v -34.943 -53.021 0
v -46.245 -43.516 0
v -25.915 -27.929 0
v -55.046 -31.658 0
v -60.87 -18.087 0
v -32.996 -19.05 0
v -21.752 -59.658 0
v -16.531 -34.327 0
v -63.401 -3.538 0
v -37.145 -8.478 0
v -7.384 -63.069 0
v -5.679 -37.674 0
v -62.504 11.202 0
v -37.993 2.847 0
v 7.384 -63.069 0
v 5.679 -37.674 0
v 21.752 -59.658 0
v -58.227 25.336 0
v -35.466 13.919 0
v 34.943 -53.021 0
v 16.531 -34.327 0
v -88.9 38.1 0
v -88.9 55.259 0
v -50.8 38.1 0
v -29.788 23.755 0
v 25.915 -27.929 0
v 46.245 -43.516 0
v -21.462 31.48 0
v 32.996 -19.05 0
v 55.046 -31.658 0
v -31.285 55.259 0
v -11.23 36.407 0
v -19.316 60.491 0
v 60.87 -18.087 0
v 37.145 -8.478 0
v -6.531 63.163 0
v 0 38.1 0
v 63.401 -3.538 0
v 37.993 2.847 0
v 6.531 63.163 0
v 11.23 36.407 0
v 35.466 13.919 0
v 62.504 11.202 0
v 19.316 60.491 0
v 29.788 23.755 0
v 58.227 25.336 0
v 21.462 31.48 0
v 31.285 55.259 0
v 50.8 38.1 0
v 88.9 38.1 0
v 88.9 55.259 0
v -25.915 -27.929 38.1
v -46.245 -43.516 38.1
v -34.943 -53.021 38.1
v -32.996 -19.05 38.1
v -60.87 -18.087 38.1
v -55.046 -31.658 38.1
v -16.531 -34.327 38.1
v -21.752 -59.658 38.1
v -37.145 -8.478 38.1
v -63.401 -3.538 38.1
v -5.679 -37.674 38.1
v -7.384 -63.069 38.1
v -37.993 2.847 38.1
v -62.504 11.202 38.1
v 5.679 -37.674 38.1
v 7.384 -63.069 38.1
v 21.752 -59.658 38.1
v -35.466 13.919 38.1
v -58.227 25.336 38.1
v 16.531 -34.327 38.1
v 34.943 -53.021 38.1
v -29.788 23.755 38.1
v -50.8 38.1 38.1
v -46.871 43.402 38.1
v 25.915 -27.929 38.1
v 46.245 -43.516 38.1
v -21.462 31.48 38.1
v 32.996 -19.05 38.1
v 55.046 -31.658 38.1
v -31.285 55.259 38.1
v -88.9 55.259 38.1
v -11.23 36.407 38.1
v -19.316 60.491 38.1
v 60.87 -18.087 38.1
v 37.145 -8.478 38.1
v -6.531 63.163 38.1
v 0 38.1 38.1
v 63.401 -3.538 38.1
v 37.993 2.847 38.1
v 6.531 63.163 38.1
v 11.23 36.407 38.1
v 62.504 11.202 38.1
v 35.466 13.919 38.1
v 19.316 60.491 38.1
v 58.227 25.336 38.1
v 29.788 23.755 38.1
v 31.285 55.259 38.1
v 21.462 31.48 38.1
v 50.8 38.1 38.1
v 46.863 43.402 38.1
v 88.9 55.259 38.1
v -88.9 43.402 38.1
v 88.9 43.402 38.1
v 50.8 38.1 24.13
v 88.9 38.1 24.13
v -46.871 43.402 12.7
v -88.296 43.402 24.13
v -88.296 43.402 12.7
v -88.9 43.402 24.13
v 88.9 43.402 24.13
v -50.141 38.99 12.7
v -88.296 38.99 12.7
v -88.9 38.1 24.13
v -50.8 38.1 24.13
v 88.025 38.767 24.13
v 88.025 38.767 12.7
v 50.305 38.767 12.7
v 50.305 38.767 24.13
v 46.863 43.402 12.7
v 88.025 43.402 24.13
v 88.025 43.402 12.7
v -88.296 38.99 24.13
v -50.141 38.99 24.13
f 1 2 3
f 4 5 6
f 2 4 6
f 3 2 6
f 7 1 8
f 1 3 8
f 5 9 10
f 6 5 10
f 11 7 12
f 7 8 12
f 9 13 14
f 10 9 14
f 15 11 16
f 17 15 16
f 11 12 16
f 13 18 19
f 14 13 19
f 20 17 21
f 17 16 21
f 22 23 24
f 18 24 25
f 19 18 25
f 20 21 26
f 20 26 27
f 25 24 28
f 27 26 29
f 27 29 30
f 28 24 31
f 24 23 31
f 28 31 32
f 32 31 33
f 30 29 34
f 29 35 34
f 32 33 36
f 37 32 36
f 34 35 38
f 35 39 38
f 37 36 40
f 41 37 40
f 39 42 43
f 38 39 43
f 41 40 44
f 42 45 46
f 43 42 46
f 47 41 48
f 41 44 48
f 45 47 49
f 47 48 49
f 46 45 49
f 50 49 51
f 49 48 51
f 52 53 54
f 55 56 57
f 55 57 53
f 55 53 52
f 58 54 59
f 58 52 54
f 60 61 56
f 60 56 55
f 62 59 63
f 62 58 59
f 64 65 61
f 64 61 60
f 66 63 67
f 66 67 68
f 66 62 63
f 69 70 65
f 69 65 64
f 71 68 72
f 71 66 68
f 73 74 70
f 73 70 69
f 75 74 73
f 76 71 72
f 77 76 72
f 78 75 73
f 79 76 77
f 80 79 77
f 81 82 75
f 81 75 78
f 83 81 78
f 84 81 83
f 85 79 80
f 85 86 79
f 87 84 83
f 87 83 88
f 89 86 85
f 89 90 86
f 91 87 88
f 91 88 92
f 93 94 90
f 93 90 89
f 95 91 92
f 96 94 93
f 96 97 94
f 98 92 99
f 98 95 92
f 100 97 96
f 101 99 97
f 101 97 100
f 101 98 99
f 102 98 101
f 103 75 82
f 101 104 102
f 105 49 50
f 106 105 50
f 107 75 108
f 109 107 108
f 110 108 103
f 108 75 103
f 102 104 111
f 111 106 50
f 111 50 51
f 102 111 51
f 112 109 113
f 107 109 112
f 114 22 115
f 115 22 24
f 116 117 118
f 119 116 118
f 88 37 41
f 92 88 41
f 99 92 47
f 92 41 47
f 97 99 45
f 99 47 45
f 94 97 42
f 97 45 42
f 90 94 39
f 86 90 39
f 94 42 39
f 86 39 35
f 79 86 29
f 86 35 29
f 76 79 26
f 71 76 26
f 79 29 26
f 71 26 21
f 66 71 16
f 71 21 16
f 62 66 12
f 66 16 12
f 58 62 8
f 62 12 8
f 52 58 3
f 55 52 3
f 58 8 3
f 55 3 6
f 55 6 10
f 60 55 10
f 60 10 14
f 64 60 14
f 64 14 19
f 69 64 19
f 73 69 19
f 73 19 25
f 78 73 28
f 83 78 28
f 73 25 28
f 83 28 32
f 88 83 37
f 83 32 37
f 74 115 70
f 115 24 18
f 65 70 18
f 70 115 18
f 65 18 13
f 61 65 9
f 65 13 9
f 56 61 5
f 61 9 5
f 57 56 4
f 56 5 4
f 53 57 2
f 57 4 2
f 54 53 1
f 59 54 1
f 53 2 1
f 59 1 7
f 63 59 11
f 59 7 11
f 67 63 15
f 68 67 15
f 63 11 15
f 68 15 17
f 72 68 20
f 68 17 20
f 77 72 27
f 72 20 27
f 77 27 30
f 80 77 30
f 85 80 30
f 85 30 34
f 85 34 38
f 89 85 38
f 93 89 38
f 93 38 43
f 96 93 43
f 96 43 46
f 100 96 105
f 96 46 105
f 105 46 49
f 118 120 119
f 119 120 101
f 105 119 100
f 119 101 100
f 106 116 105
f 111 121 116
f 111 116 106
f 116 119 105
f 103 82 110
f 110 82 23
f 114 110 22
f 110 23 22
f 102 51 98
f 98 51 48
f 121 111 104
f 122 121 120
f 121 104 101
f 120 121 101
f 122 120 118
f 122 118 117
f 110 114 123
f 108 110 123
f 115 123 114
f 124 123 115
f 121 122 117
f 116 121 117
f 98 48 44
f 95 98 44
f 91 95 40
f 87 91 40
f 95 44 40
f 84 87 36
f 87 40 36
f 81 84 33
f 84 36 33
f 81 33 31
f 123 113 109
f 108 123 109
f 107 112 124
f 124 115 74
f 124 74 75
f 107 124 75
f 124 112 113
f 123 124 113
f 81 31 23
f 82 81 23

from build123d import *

# Parameters (mm, degrees)
F1_DEPTH = 38.1
F3_DEPTH = 25.4
F5_DEPTH = 11.43


with BuildPart() as f1:
    # F0 (on Top) → F1 (new body)
    with BuildSketch(Plane.XY):
        with BuildLine():
            ThreePointArc((-50.8, 38.1), (-20.0804631421, -60.2413894262), (63.5, 0))
            ThreePointArc((63.5, 0), (60.2413894262, 20.0804631421), (50.8, 38.1))
            Line((50.8, 38.1), (0, 38.1))
            Line((0, 38.1), (-50.8, 38.1))
        make_face()
        with BuildLine():
            ThreePointArc((38.1, 0), (-26.9407683632, -26.9407683632), (0, 38.1))
            ThreePointArc((0, 38.1), (26.9407683632, 26.9407683632), (38.1, 0))
        make_face(mode=Mode.SUBTRACT)
        with BuildLine():
            Line((0, 38.1), (50.8, 38.1))
            ThreePointArc((50.8, 38.1), (41.9294068416, 47.6883092792), (31.2845870641, 55.258706212))
            Line((31.2845870641, 55.258706212), (0, 55.258706212))
            Line((0, 55.258706212), (0, 38.1))
        make_face()
        with BuildLine():
            ThreePointArc((31.2845870641, 55.258706212), (41.9294068416, 47.6883092792), (50.8, 38.1))
            Line((50.8, 38.1), (88.9, 38.1))
            Line((88.9, 38.1), (88.9, 55.258706212))
            Line((88.9, 55.258706212), (31.2845870641, 55.258706212))
        make_face()
        with BuildLine():
            Line((-88.9, 38.1), (-50.8, 38.1))
            ThreePointArc((-50.8, 38.1), (-41.9294068416, 47.6883092792), (-31.2845870641, 55.258706212))
            Line((-31.2845870641, 55.258706212), (-88.9, 55.258706212))
            Line((-88.9, 55.258706212), (-88.9, 38.1))
        make_face()
        with BuildLine():
            ThreePointArc((-31.2845870641, 55.258706212), (-41.9294068416, 47.6883092792), (-50.8, 38.1))
            Line((-50.8, 38.1), (0, 38.1))
            Line((0, 38.1), (0, 55.258706212))
            Line((0, 55.258706212), (-31.2845870641, 55.258706212))
        make_face()
        with BuildLine():
            Line((0, 55.258706212), (31.2845870641, 55.258706212))
            ThreePointArc((31.2845870641, 55.258706212), (0, 63.5), (-31.2845870641, 55.258706212))
            Line((-31.2845870641, 55.258706212), (0, 55.258706212))
        make_face()
    extrude(amount=F1_DEPTH)

    # F2 (on face) → F3 (cut)
    with BuildSketch(Plane.XY.offset(38.1)):
        Polygon((-46.8710027635, 43.4018671513), (-88.9, 43.4018671513), (-88.9, 38.1), (-50.8, 38.1), align=None)
        Polygon((88.9, 38.1), (88.9, 43.4018671513), (46.863, 43.4018671513), (50.8, 38.1), align=None)
    extrude(amount=-F3_DEPTH, mode=Mode.SUBTRACT)

    # F4 (on face) → F5 (join)
    with BuildSketch(Plane.XY.offset(12.7)):
        Polygon((-50.1407290747, 38.9896333218), (-88.2961526513, 38.9896333218), (-88.2961526513, 43.4018671513), (-88.9, 43.4018671513), (-88.9, 38.9896333218), (-88.9, 38.1), (-50.8, 38.1), align=None)
        Polygon((88.9, 38.1), (88.9, 43.4018671513), (88.0254730582, 43.4018671513), (88.0254730582, 38.7667292968), (50.304907768, 38.7667292968), (50.8, 38.1), align=None)
    extrude(amount=F5_DEPTH)


solid = f1.part
